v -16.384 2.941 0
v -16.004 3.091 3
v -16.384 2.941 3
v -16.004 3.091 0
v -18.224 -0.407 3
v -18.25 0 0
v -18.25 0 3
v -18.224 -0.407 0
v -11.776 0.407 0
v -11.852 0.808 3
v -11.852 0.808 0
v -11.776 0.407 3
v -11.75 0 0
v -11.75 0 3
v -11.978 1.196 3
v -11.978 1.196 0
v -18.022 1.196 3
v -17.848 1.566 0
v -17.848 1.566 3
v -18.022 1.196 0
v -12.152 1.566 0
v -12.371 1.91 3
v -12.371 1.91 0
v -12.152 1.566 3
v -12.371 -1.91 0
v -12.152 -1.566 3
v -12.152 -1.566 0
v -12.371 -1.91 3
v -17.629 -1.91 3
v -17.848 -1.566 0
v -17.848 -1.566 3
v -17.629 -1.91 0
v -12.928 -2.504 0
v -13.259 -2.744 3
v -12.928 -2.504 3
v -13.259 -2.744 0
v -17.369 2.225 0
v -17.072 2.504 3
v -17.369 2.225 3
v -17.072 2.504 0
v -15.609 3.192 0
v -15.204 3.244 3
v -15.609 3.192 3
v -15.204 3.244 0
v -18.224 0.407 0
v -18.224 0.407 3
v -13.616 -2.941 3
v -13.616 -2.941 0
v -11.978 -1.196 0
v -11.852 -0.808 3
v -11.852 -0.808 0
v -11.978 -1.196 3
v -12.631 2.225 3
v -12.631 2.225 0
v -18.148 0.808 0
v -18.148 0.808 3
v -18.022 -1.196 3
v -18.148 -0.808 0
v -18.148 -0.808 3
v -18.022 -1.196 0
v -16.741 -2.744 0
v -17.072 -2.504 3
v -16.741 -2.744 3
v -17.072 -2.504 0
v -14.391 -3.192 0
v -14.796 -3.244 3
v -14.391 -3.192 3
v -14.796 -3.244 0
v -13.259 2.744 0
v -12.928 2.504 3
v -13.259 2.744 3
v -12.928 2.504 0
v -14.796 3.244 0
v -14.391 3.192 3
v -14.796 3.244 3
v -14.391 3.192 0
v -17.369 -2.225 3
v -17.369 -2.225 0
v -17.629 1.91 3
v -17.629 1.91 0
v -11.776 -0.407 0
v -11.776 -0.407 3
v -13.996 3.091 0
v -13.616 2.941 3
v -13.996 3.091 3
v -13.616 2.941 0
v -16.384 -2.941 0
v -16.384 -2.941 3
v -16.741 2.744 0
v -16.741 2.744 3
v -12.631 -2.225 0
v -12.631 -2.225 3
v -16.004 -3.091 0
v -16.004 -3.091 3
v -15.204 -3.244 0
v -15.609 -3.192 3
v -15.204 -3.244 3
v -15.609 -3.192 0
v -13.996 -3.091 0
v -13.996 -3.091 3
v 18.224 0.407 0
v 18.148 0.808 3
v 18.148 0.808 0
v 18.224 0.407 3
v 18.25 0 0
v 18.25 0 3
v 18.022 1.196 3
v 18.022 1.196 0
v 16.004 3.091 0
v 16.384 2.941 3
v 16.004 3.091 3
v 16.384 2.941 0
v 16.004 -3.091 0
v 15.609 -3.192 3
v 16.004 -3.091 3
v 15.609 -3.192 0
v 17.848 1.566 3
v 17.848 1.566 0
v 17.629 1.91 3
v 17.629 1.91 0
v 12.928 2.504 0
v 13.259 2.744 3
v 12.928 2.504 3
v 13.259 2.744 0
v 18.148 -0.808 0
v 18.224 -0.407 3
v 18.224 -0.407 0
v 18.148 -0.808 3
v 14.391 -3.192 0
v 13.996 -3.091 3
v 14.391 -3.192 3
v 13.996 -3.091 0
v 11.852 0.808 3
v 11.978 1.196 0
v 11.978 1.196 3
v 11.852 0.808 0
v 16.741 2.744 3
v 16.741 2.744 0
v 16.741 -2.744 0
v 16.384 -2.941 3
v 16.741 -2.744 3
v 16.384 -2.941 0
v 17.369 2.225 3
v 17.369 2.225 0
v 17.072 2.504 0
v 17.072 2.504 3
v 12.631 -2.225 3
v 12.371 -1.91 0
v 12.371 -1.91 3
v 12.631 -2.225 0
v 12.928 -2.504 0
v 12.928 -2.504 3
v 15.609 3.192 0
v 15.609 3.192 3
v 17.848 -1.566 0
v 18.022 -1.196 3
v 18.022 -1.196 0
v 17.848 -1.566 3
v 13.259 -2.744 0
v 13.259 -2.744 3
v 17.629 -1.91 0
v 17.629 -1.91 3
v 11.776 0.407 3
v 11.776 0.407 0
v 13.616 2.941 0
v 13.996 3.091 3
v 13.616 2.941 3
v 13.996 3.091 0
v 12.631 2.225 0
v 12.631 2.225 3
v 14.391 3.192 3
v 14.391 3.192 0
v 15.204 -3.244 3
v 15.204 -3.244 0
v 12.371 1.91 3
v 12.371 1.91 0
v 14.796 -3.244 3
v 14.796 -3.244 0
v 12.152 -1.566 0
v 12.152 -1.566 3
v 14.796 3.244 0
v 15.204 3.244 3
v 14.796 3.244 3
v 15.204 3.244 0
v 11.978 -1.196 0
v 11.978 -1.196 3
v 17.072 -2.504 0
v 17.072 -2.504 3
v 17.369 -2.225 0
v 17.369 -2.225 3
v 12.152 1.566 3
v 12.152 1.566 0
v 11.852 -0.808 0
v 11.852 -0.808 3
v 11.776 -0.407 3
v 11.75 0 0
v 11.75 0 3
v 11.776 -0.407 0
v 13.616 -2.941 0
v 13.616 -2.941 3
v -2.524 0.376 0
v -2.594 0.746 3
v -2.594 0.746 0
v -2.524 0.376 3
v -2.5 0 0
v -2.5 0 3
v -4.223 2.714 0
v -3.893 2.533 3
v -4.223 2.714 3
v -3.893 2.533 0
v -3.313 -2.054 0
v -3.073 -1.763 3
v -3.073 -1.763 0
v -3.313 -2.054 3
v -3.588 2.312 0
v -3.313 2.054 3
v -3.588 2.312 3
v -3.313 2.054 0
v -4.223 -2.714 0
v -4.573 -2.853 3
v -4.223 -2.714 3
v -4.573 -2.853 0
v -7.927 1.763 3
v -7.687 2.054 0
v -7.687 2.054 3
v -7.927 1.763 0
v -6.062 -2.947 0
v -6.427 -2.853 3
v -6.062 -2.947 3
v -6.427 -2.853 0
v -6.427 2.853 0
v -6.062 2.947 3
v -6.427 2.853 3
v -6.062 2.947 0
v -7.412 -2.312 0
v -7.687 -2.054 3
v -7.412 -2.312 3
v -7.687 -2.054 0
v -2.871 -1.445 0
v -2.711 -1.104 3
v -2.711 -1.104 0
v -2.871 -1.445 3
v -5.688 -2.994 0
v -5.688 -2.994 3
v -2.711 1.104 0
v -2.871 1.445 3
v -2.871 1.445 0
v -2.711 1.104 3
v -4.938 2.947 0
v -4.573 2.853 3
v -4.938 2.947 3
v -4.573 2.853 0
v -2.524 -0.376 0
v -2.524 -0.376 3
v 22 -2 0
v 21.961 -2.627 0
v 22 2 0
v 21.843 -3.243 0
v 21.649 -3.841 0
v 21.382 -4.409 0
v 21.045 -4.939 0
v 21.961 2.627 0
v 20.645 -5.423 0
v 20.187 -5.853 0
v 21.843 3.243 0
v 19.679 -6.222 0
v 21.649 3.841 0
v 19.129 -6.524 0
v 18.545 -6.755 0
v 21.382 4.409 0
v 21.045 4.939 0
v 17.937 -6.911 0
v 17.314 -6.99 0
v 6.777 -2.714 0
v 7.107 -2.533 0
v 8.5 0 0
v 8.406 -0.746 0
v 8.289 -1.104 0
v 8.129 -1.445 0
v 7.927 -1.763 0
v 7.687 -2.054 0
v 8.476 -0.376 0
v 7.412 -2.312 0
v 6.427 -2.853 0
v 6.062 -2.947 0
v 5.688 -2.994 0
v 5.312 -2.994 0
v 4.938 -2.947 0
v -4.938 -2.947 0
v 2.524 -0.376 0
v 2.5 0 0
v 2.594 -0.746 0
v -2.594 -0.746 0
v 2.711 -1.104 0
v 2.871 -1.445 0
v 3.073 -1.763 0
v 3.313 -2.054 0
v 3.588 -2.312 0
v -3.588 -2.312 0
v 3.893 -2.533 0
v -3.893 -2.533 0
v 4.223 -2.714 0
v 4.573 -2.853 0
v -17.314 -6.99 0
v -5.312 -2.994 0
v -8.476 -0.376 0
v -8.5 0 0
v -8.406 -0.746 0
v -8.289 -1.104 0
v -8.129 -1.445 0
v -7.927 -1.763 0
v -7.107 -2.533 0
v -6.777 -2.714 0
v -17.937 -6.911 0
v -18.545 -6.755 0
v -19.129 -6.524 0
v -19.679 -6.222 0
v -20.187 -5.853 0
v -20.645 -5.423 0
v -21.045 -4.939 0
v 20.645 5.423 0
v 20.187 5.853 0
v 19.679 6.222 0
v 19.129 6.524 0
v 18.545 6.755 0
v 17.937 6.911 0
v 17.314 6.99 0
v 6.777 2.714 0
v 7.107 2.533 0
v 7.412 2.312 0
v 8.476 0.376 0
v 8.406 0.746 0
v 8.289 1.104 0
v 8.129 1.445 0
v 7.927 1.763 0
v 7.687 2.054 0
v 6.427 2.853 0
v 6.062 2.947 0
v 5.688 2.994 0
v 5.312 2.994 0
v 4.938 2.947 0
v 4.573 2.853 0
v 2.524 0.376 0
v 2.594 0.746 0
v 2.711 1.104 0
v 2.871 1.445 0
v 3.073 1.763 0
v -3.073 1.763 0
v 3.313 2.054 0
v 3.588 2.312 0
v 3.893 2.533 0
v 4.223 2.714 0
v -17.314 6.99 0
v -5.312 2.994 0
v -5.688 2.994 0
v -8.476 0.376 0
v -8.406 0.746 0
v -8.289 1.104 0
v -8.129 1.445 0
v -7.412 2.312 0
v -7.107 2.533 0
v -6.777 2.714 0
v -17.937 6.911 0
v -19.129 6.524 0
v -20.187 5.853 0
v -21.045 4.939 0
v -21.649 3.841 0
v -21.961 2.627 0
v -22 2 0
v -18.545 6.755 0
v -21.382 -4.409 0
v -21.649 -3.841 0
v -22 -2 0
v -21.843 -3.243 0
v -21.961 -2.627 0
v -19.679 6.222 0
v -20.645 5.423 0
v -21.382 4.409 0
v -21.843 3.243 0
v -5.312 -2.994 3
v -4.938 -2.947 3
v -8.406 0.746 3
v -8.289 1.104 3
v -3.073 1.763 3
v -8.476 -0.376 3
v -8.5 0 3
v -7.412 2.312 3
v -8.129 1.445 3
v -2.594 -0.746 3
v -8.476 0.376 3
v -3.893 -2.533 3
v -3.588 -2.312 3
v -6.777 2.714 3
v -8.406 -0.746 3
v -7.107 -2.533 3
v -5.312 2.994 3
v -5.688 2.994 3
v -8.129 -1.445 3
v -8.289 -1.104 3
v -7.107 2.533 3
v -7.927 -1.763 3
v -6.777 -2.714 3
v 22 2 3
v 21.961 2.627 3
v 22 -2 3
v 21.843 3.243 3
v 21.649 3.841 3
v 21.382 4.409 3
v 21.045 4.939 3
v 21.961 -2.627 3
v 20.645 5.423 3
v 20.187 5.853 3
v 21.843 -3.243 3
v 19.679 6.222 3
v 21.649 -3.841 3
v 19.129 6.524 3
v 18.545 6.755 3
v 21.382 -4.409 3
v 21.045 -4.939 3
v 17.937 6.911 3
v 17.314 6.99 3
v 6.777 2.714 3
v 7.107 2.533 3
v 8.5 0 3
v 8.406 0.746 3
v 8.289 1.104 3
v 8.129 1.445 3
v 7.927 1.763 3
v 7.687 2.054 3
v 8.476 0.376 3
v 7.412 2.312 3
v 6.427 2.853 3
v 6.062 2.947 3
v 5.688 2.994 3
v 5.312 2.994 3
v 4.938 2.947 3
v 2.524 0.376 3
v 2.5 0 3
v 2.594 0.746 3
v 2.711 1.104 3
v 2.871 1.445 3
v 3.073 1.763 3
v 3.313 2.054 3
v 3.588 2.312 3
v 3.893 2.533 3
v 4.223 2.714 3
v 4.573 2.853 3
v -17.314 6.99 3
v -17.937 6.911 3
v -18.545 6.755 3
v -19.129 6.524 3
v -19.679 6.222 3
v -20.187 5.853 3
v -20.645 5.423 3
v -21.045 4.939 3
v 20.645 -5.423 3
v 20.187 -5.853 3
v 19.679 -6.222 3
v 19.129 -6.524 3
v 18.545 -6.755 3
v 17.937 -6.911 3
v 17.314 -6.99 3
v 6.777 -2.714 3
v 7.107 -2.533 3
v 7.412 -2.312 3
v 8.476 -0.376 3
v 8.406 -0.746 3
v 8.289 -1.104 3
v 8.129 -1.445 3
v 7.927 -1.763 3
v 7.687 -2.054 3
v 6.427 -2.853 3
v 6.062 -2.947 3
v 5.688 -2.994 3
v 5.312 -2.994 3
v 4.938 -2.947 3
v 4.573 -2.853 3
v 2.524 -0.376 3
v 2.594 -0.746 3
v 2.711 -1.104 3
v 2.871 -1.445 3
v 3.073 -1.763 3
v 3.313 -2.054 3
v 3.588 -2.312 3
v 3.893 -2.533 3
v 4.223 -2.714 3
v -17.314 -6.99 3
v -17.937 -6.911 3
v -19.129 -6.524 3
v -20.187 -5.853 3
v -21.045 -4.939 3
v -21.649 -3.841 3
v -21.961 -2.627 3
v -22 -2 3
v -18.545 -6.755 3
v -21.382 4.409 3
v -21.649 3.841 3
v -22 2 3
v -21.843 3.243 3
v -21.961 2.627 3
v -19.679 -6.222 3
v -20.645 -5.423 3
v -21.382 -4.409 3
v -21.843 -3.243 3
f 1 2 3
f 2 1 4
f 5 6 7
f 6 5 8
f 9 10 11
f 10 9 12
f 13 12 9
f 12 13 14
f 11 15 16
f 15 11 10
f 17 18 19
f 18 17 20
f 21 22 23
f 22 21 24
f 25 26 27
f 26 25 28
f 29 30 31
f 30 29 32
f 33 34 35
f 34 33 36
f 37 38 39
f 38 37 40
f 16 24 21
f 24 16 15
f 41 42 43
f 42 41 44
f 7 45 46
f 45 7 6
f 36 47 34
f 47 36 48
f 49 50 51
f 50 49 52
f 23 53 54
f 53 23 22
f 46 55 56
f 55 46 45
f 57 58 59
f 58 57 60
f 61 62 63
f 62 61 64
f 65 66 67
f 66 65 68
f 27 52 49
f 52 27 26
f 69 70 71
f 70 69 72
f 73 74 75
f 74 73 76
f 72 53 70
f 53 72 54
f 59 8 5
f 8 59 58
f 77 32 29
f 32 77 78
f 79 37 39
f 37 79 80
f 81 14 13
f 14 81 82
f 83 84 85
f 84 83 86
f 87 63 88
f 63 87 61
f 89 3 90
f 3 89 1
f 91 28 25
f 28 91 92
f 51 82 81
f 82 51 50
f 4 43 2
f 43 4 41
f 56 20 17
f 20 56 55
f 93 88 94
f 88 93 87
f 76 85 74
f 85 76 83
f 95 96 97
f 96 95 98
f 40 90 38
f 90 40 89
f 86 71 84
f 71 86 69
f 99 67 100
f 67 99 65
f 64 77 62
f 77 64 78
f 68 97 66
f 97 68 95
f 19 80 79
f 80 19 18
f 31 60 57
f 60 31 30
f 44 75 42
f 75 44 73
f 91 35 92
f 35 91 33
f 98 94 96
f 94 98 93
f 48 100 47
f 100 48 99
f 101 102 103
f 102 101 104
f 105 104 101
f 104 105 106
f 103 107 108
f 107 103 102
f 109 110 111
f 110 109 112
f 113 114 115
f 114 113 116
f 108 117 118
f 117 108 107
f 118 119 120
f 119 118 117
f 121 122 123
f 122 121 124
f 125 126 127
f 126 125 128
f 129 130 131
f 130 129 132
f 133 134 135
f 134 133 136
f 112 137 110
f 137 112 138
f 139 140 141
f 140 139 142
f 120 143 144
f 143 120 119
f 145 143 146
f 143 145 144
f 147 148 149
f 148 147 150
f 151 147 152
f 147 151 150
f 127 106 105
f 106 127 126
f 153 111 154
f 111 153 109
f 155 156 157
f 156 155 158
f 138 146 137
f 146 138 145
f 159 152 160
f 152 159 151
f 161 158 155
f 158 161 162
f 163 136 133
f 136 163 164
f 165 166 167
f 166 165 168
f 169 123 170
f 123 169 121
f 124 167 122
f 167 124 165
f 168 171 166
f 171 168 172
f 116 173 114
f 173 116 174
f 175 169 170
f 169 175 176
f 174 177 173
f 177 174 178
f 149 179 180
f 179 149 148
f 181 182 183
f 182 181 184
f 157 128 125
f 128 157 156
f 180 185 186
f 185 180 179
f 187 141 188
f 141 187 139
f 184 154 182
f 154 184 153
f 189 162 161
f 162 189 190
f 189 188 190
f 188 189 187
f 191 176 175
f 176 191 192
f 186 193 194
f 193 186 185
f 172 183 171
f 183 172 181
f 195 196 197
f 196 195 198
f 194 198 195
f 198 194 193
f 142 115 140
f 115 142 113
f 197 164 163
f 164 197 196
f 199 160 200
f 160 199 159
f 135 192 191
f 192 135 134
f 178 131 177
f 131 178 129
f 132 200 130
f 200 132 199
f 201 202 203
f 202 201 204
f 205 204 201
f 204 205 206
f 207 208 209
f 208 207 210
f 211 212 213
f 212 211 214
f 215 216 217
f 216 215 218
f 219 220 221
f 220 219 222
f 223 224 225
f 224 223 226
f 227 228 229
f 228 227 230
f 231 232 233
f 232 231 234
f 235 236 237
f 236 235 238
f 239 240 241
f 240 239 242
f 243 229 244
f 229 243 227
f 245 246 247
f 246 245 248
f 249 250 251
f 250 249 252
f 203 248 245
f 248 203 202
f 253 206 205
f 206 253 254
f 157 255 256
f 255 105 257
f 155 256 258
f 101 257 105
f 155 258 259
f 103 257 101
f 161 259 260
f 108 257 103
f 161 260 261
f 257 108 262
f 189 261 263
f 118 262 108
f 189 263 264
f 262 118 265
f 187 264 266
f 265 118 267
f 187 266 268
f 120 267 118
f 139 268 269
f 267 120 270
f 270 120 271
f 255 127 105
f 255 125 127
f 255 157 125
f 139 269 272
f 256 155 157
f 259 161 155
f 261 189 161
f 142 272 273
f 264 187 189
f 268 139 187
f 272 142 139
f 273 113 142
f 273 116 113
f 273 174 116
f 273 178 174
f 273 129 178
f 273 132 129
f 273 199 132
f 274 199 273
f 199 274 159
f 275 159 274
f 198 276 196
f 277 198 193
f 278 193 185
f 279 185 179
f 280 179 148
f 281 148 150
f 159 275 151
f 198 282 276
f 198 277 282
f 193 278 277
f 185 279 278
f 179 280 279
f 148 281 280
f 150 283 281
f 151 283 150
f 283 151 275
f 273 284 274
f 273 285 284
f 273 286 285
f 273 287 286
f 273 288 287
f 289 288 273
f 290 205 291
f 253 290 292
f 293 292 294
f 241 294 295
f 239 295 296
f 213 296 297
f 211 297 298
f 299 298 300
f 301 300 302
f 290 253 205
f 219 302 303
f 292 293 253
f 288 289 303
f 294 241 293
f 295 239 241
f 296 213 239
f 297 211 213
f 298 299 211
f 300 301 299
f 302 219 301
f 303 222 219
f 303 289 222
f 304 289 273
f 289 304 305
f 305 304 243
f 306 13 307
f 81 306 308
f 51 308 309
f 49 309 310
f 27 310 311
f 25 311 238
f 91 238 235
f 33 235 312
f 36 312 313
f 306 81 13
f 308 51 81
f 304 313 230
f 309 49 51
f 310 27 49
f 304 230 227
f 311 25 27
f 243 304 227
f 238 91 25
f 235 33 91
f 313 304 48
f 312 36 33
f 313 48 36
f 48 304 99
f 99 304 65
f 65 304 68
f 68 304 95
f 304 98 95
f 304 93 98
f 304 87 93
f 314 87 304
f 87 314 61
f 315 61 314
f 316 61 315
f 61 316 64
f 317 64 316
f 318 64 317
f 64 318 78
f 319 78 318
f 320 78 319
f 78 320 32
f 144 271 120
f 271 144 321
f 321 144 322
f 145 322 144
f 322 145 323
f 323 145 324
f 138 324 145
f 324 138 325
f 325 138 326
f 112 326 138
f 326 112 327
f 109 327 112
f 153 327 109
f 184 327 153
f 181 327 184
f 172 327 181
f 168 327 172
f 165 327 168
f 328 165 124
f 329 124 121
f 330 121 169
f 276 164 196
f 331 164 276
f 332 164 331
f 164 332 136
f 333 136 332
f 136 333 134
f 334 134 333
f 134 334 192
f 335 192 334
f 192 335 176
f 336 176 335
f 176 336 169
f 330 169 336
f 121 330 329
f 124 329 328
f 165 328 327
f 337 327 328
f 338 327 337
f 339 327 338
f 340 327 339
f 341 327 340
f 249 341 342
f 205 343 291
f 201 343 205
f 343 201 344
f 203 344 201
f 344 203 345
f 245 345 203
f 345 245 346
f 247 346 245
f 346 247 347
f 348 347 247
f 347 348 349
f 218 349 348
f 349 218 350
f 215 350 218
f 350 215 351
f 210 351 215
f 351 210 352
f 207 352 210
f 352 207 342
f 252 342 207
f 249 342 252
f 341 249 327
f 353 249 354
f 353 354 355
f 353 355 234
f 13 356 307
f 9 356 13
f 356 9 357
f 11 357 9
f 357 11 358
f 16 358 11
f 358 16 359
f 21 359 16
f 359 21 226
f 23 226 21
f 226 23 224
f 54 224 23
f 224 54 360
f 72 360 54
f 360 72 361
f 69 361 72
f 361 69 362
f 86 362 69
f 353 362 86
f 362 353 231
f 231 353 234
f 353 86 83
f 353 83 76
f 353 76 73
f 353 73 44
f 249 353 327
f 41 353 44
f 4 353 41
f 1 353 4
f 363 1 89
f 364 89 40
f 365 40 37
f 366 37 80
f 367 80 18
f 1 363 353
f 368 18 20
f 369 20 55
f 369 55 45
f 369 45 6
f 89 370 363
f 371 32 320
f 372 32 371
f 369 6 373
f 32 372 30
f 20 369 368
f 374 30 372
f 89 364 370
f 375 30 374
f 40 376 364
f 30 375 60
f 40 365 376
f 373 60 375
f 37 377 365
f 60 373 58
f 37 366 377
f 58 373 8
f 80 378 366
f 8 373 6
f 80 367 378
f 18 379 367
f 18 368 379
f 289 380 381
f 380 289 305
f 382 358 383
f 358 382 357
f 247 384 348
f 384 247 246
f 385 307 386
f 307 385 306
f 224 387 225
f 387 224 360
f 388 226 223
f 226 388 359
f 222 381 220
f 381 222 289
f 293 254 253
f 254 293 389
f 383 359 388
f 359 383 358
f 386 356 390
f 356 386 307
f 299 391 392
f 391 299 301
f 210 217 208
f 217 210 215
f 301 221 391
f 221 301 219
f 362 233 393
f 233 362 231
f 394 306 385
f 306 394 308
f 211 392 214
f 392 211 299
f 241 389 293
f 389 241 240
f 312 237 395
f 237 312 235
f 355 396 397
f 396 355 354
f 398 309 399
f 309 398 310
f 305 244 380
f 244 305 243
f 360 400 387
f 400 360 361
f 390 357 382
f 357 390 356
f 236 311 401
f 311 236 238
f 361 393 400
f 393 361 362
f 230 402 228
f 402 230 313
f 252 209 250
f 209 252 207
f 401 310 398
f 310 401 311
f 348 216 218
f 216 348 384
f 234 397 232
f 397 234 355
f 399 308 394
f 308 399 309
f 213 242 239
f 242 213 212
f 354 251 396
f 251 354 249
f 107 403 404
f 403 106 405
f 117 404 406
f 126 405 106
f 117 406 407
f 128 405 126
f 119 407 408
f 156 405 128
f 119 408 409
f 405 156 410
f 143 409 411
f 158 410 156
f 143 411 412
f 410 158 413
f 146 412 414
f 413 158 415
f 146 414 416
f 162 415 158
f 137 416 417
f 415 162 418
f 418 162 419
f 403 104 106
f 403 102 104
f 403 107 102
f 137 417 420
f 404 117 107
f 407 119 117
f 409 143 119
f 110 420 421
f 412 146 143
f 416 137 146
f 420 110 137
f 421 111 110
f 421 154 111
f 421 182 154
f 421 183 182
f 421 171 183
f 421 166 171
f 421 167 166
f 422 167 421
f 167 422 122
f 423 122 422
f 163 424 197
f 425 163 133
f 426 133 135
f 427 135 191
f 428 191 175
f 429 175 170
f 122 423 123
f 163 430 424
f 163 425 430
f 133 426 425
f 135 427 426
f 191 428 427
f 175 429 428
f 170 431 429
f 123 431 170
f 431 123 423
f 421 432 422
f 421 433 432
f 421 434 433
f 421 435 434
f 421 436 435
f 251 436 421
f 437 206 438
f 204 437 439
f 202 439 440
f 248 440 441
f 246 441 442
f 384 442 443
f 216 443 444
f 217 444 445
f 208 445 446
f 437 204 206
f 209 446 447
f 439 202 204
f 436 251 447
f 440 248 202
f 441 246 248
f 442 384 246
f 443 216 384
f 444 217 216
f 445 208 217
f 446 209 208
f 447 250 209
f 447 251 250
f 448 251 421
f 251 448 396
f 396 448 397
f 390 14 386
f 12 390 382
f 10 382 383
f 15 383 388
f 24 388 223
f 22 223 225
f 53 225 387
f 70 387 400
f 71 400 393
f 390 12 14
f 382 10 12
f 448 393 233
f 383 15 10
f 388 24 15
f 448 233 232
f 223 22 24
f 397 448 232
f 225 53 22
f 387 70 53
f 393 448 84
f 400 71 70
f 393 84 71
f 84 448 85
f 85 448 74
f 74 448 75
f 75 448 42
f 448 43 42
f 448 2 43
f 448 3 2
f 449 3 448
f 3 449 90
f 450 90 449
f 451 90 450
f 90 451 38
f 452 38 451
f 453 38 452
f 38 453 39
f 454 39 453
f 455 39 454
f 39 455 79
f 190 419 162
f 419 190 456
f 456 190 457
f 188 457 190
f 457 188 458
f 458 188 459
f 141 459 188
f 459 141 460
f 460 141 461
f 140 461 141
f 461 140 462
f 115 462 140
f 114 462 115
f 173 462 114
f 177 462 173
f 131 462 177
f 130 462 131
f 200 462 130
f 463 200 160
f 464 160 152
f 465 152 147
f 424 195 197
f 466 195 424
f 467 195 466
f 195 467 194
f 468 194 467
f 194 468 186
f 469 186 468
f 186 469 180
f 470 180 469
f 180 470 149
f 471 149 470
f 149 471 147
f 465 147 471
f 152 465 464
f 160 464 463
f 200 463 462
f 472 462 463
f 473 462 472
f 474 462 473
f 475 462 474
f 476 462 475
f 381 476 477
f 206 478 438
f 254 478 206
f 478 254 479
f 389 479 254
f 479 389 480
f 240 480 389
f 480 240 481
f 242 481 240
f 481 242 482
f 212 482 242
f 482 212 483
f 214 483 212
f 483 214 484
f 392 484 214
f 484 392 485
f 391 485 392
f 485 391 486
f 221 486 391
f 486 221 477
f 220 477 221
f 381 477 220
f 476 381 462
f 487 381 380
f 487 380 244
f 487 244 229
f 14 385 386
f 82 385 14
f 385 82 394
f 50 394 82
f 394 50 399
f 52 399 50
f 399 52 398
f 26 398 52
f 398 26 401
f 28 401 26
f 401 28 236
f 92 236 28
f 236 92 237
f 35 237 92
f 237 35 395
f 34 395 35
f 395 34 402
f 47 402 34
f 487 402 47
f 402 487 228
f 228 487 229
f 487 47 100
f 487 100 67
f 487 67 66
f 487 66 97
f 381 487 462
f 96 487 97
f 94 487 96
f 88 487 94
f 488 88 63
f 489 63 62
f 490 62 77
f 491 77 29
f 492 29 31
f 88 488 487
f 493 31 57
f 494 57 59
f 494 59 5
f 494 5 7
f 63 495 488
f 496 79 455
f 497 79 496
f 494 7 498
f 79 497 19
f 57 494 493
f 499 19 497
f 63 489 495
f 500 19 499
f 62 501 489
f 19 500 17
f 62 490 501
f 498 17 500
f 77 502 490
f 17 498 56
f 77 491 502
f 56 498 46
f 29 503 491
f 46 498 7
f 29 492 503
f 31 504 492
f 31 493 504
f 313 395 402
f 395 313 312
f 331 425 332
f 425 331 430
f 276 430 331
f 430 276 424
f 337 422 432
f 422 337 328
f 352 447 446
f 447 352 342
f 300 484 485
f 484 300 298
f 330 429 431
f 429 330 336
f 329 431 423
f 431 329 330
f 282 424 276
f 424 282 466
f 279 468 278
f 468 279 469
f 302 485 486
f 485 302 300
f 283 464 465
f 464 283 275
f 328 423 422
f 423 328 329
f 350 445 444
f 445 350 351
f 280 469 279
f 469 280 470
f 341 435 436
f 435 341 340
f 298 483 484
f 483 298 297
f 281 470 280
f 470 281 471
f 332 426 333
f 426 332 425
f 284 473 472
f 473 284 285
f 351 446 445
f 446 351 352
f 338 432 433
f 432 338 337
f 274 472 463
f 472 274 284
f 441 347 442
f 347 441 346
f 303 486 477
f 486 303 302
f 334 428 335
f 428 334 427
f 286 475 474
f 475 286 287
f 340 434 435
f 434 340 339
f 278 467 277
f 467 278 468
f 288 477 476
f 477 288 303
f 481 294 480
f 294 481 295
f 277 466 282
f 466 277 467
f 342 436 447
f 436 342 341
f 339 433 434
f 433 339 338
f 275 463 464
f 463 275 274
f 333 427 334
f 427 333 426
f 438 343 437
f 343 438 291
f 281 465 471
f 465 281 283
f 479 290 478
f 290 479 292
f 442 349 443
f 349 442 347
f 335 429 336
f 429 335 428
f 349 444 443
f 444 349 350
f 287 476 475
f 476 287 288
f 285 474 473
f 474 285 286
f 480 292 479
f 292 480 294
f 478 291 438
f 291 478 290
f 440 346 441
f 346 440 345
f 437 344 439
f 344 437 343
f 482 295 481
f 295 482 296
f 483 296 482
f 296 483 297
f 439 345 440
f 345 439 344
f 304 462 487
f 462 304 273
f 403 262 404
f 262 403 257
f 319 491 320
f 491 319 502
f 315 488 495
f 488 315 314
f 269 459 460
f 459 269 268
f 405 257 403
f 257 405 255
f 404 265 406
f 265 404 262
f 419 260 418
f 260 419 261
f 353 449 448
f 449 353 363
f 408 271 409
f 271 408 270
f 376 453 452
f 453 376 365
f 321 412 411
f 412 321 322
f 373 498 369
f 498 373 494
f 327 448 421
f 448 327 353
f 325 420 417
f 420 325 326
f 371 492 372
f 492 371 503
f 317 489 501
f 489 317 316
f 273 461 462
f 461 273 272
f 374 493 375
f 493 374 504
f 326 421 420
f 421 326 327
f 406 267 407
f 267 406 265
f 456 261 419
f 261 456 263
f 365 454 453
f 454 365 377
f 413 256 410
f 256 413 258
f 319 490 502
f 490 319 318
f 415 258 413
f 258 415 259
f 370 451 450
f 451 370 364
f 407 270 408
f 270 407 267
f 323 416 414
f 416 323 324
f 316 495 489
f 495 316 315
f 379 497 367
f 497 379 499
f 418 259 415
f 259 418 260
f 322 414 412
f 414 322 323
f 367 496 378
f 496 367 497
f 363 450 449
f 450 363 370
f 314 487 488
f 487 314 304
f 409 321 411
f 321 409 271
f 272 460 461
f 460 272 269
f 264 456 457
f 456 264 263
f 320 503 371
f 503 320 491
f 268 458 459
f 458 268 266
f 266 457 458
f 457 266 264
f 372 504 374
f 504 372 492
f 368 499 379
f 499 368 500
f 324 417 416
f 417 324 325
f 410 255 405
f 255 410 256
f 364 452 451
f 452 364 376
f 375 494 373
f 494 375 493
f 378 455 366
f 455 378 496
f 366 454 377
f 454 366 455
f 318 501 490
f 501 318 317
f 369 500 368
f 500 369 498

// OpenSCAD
$fn = 50;


difference() {
	union() {
		hull() {
			translate(v = [-17.0000000000, 2.0000000000, 0]) {
				cylinder(h = 3, r = 5);
			}
			translate(v = [17.0000000000, 2.0000000000, 0]) {
				cylinder(h = 3, r = 5);
			}
			translate(v = [-17.0000000000, -2.0000000000, 0]) {
				cylinder(h = 3, r = 5);
			}
			translate(v = [17.0000000000, -2.0000000000, 0]) {
				cylinder(h = 3, r = 5);
			}
		}
	}
	union() {
		#translate(v = [-15.0000000000, 0.0000000000, 0]) {
			cylinder(h = 3, r = 3.2500000000);
		}
		#translate(v = [15.0000000000, 0.0000000000, 0]) {
			cylinder(h = 3, r = 3.2500000000);
		}
		#translate(v = [-15.0000000000, 0.0000000000, -100.0000000000]) {
			cylinder(h = 200, r = 3.2500000000);
		}
		#translate(v = [-15.0000000000, 0.0000000000, -100.0000000000]) {
			cylinder(h = 200, r = 3.2500000000);
		}
		#translate(v = [15.0000000000, 0.0000000000, -100.0000000000]) {
			cylinder(h = 200, r = 3.2500000000);
		}
		#translate(v = [15.0000000000, 0.0000000000, -100.0000000000]) {
			cylinder(h = 200, r = 3.2500000000);
		}
		#translate(v = [-15.0000000000, 0.0000000000, 0]) {
			cylinder(h = 3, r = 1.8000000000);
		}
		#translate(v = [15.0000000000, 0.0000000000, 0]) {
			cylinder(h = 3, r = 1.8000000000);
		}
		#translate(v = [-15.0000000000, 0.0000000000, 0]) {
			cylinder(h = 3, r = 1.8000000000);
		}
		#translate(v = [15.0000000000, 0.0000000000, 0]) {
			cylinder(h = 3, r = 1.8000000000);
		}
		#translate(v = [-15.0000000000, 0.0000000000, 0]) {
			cylinder(h = 3, r = 1.8000000000);
		}
		#translate(v = [15.0000000000, 0.0000000000, 0]) {
			cylinder(h = 3, r = 1.8000000000);
		}
		#translate(v = [-5.5000000000, 0, 0]) {
			cylinder(h = 3, r = 3.0000000000);
		}
		#translate(v = [5.5000000000, 0, 0]) {
			cylinder(h = 3, r = 3.0000000000);
		}
	}
}
